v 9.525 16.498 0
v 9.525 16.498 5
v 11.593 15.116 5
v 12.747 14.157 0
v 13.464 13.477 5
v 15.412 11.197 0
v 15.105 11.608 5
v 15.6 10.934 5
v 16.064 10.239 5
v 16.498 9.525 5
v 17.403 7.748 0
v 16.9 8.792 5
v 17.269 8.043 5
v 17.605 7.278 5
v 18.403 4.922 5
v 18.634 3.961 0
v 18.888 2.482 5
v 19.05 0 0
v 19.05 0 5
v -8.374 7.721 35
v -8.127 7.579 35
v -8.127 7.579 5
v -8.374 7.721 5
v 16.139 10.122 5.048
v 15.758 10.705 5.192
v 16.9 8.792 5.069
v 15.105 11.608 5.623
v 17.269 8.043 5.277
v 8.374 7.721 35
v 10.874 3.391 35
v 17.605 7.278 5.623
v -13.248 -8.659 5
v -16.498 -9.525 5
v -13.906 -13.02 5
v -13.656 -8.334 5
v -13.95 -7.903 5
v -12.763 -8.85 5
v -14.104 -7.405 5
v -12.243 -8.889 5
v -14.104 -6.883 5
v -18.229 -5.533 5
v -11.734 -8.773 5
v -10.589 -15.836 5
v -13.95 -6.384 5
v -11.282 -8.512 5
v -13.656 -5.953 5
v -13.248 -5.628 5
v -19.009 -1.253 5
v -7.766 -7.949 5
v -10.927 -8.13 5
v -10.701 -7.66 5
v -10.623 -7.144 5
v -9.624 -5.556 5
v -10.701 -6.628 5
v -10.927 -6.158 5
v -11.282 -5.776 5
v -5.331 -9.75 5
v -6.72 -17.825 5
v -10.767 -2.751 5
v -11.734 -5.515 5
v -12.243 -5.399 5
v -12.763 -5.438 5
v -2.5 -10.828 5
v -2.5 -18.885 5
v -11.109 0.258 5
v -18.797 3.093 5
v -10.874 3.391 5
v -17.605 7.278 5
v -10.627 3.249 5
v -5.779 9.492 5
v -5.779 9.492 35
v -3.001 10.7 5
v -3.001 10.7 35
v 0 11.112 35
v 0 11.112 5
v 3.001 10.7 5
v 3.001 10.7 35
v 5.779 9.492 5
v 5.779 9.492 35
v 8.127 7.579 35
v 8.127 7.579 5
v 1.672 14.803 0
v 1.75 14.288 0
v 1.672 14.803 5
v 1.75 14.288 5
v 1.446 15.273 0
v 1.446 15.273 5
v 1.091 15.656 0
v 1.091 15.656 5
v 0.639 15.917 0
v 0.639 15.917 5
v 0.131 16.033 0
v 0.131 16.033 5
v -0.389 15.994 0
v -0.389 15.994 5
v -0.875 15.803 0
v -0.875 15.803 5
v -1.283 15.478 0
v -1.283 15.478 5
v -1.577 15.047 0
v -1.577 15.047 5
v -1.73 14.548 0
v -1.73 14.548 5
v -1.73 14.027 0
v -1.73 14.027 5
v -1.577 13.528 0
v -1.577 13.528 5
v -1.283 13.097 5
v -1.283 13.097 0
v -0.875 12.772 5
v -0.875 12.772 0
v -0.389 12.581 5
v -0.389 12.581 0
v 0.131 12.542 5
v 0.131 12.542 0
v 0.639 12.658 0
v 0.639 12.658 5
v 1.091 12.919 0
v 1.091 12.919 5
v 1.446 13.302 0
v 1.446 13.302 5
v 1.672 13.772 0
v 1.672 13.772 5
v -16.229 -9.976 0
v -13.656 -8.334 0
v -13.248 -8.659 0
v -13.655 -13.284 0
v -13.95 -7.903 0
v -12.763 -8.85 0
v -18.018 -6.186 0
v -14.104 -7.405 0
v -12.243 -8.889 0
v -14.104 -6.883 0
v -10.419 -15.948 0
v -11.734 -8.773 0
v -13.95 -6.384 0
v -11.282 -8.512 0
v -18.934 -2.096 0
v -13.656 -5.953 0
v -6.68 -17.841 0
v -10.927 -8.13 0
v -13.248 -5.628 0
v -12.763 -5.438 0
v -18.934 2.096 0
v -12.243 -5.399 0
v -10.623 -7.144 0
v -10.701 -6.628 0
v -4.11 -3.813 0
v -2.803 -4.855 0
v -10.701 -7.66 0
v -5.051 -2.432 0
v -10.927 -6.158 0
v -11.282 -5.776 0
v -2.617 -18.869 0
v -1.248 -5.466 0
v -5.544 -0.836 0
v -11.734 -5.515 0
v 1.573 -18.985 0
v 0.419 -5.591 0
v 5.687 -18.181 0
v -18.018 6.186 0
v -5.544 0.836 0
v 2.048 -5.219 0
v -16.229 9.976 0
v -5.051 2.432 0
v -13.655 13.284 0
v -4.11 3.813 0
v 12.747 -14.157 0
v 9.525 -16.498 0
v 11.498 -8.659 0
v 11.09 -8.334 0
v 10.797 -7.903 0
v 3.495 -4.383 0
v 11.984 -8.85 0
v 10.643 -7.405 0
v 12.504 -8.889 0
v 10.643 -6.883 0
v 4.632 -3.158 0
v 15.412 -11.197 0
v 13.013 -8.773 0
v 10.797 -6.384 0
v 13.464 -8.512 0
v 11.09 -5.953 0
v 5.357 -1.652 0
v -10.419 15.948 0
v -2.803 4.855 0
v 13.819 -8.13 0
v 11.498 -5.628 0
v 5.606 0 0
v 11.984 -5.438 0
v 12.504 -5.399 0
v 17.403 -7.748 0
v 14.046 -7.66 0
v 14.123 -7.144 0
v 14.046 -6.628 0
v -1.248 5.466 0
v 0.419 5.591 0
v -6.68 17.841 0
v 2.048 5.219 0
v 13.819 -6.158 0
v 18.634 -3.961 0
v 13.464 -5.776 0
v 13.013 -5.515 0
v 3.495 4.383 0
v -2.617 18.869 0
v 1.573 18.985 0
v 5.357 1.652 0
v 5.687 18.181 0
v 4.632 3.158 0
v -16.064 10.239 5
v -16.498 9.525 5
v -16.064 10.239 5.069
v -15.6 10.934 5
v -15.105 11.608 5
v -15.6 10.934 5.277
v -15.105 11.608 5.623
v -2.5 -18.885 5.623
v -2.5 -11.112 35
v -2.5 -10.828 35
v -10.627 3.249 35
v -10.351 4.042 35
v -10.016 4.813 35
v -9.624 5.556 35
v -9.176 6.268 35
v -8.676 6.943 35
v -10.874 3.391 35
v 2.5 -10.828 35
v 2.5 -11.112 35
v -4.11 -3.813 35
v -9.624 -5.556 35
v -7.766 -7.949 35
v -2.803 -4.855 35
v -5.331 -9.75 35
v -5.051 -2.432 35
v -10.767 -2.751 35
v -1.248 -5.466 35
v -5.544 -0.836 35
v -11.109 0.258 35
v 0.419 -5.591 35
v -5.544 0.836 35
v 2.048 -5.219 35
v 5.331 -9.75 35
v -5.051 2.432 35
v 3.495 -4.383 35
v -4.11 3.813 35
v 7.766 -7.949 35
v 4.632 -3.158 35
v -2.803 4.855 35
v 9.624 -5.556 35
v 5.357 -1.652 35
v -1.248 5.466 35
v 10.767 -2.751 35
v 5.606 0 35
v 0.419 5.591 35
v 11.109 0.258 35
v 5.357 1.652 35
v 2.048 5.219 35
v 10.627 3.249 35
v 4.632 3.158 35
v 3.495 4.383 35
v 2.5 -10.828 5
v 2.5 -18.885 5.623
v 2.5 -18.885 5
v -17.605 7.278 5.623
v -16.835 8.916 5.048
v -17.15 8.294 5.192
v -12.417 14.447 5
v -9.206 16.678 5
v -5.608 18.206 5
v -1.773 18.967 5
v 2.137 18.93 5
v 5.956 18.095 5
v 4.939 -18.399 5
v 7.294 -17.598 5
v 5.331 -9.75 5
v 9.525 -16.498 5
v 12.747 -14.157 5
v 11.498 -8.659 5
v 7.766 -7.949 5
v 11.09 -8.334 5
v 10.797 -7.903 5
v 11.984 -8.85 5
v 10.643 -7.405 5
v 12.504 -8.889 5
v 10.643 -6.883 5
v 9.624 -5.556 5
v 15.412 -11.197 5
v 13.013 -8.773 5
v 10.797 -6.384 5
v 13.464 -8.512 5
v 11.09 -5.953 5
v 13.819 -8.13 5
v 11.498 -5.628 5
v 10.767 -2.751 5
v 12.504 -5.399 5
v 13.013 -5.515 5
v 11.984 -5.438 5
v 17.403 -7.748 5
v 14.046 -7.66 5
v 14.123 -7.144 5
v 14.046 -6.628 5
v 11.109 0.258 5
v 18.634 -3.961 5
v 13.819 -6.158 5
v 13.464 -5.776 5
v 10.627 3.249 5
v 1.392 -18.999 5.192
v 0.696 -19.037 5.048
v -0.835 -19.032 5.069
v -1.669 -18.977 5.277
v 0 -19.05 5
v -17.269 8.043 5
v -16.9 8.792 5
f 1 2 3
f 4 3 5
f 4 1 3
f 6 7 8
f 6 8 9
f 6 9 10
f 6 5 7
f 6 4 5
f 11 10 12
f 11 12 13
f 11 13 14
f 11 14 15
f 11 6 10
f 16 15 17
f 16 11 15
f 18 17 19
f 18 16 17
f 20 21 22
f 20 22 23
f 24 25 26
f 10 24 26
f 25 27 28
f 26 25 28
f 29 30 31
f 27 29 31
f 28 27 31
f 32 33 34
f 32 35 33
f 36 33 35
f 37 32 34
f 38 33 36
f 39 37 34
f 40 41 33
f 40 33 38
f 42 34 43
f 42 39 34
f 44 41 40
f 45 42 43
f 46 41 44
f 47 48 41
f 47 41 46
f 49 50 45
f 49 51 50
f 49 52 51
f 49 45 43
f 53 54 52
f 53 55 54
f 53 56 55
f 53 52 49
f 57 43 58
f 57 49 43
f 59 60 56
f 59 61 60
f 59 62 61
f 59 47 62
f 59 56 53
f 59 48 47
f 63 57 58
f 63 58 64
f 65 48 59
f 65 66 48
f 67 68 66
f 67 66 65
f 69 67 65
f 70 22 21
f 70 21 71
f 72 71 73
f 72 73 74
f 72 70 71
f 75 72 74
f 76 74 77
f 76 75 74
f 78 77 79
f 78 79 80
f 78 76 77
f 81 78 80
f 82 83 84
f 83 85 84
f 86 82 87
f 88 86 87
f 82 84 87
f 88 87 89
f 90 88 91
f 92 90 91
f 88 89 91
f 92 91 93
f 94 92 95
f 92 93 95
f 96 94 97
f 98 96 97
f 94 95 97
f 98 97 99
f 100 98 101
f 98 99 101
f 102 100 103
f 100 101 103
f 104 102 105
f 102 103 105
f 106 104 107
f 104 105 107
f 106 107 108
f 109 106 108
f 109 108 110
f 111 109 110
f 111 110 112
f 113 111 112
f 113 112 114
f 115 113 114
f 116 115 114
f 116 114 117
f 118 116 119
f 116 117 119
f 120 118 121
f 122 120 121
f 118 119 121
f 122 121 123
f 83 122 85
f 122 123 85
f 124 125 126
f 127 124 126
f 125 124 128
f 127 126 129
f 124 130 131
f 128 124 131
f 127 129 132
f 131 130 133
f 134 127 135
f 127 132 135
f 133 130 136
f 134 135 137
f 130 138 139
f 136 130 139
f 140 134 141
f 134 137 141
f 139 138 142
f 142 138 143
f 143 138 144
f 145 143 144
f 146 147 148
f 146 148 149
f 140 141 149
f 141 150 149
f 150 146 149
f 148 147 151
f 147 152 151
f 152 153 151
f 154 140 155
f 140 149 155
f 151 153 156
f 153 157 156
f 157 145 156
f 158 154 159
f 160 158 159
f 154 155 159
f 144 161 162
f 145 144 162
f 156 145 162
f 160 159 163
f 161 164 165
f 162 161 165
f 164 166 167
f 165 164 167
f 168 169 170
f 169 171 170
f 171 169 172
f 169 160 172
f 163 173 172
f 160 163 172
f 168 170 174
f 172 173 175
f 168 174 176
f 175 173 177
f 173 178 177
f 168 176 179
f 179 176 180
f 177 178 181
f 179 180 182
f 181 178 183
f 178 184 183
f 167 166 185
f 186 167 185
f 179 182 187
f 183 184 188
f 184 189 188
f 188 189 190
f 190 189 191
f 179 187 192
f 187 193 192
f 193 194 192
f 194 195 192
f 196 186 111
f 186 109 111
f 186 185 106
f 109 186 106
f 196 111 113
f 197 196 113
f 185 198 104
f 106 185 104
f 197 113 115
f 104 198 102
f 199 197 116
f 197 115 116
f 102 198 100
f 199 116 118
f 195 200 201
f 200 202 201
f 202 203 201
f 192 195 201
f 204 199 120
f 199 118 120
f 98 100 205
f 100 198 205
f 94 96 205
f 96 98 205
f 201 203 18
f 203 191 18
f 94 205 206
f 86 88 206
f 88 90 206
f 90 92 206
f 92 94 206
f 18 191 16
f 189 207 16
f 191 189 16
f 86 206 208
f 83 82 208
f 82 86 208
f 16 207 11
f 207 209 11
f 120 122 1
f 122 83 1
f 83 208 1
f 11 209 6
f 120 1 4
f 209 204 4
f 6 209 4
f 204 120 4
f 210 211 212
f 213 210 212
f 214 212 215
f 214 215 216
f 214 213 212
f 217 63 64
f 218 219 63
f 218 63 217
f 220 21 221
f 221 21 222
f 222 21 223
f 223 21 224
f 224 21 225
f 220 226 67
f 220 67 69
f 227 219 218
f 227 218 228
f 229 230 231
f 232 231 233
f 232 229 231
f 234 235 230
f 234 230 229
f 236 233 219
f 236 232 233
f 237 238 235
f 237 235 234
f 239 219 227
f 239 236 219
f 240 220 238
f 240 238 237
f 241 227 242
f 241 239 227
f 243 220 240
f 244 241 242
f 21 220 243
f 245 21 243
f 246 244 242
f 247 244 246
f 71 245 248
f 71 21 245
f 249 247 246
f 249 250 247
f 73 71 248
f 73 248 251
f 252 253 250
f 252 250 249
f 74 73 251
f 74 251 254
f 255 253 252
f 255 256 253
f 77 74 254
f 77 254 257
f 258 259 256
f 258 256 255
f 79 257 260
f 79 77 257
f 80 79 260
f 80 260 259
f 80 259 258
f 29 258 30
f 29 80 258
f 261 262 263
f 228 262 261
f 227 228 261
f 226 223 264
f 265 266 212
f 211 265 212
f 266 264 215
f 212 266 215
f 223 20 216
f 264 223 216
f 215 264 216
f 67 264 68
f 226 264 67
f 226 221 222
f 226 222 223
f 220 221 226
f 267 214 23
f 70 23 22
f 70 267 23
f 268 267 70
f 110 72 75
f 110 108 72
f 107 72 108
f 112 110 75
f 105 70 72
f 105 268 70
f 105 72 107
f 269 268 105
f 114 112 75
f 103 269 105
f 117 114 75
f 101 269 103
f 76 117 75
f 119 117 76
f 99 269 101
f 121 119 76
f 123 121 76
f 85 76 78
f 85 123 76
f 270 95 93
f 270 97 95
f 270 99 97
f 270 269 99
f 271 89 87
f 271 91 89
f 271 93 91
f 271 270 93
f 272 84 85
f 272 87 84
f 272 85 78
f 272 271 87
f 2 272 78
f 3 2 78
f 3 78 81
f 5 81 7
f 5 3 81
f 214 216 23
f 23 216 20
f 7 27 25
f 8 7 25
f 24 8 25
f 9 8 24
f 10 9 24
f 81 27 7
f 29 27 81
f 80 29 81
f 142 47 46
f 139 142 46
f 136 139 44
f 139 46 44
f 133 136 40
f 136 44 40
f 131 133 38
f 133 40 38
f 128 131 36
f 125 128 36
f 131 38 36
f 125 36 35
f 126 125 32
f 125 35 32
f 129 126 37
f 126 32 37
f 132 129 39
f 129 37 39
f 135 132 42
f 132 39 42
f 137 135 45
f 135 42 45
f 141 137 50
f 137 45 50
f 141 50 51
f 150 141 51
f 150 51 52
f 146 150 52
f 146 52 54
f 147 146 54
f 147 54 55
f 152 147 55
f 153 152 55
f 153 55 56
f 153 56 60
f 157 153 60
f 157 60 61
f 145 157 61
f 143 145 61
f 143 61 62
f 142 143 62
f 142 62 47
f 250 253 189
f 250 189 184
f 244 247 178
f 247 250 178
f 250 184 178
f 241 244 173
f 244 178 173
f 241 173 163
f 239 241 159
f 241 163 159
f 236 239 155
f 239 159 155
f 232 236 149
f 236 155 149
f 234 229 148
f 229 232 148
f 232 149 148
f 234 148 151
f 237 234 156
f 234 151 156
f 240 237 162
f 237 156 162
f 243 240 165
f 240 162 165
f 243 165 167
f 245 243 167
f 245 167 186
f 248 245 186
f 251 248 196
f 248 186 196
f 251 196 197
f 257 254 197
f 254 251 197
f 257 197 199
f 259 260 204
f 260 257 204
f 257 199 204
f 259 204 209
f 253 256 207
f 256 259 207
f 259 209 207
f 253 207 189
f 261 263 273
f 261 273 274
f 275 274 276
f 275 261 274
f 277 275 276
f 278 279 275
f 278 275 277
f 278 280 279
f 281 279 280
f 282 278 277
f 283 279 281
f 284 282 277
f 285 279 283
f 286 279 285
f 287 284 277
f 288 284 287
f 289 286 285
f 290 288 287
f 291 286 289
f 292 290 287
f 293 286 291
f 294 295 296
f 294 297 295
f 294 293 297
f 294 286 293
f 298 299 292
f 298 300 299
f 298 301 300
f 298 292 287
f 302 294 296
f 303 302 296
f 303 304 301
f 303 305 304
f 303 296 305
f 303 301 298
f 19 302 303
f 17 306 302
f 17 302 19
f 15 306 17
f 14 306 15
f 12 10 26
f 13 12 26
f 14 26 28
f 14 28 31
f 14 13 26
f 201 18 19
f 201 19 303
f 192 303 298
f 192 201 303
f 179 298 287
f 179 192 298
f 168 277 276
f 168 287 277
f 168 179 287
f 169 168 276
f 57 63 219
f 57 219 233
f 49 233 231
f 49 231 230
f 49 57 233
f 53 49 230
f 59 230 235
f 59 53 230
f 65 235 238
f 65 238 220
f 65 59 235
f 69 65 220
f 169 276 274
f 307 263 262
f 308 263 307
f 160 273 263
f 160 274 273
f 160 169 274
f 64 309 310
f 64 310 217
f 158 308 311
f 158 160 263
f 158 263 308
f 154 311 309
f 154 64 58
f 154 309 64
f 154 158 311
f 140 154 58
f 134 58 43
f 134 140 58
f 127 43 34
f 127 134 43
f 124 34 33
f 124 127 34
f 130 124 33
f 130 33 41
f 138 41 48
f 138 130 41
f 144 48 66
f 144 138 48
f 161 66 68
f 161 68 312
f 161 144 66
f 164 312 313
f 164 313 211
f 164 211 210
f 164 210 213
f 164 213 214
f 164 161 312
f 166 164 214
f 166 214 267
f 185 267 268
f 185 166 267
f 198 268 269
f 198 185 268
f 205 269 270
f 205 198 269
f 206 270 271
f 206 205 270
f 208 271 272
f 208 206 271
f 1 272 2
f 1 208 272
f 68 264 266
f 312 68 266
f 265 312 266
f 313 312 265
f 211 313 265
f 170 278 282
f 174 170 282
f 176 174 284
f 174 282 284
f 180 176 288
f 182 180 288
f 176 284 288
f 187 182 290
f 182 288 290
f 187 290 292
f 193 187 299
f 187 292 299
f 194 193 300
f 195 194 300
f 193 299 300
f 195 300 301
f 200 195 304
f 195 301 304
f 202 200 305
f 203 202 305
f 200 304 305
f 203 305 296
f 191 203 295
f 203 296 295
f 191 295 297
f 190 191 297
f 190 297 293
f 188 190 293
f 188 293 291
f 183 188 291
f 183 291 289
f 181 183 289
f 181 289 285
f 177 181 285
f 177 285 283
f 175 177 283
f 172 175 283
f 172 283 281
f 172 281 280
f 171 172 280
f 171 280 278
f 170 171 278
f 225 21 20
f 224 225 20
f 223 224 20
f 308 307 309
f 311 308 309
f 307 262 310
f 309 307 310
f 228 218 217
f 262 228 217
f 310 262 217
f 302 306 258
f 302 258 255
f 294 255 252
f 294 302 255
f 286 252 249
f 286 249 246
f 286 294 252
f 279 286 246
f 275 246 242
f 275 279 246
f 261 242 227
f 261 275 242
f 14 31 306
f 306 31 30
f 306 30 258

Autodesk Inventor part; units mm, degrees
ref_plane "YZ Plane" through (0, 0, 0) normal (1, 0, 0) x (0, 1, 0)
ref_plane "XZ Plane" through (0, 0, 0) normal (0, 1, 0) x (-1, 0, 0)
ref_plane "XY Plane" through (0, 0, 0) normal (0, 0, 1) x (1, 0, 0)
sketch "Sketch1" plane through (0, 0, 0) normal (0, 0, 1) x (1, 0, 0)
  circle A0 centre (0, 0) radius 19.05
  circle A1 centre (0, 0) radius 5.6063
  dimension "d0" = 11.2125
  dimension "d2" = 38.1
extrude "Extrusion1" add sketch "Sketch1" along normal blind 5
sketch "Sketch2" plane through (0, 0, 5) normal (0, 0, 1) x (1, 0, 0)
  circle A0 centre (0, 0) radius 5.6063 projected
  circle A1 centre (0, 0) radius 19.05 projected
  circle A2 centre (0, 0) radius 14.2875
  circle A3 centre (0, 0) radius 11.1125
  dimension "d5" = 28.575
  dimension "d26" = 22.225
extrude "Extrusion2" add sketch "Sketch2" along normal blind 30 contours A3
sketch "Sketch3" plane through (0, 0, 5) normal (0, 0, 1) x (1, 0, 0)
  circle A0 centre (0, 0) radius 11.1125 projected
  circle A1 centre (0, 14.2875) radius 1.75
  dimension "d11" = 14.2875
  dimension "d12" = 3.5
extrude "Extrusion3" cut sketch "Sketch3" against normal through all contours A1
sketch "Sketch4" plane through (0, 0, 0) normal (1, 0, 0) x (0, 1, 0)
  line L0 (11.1125, 35) -> (11.1125, 5) projected
  line L1 (11.1125, 5) -> (12.5375, 5) projected
  line L2 (12.5375, 5) -> (12.5375, 0) projected
  line L3 (12.5375, 0) -> (5.6063, 0) projected
  line L4 (5.6063, 0) -> (5.6063, 35) projected
  line L5 (5.6063, 35) -> (11.1125, 35) projected
  line L6 (-19.05, 0) -> (-19.05, 5) projected
  line L7 (-19.05, 5) -> (-11.1125, 5) projected
  line L8 (-11.1125, 5) -> (-11.1125, 35) projected
  line L9 (-11.1125, 35) -> (-5.6063, 35) projected
  line L10 (-5.6063, 35) -> (-5.6063, 0) projected
  line L11 (-5.6063, 0) -> (-19.05, 0) projected
  line L12 (19.05, 5) -> (19.05, 0) projected
  line L13 (19.05, 0) -> (16.0375, 0) projected
  line L14 (16.0375, 0) -> (16.0375, 5) projected
  line L15 (16.0375, 5) -> (19.05, 5) projected
  line L16 (-19.05, 5) -> (-11.1125, 5)
  line L17 (-11.1125, 35) -> (-19.05, 5)
  line L18 (-11.1125, 35) -> (-11.1125, 5)
  point P0 (0, 0)
extrude "Extrusion4" add sketch "Sketch4" along normal mid plane 5 contours L17 L8 L7
sketch "Sketch5" plane through (0, 0, 35) normal (0, 0, 1) x (1, 0, 0)
  circle A0 centre (0, 0) radius 11.1125 projected
  line L0 (2.5, -19.05) -> (0, -19.05) projected
  line L1 (2.5, -11.1125) -> (2.5, -19.05) projected
  line L2 (0, -11.1125) -> (2.5, -11.1125) projected
  line L3 (-2.5, -11.1125) -> (0, -11.1125) projected
  line L4 (-2.5, -19.05) -> (-2.5, -11.1125) projected
  line L5 (0, -19.05) -> (-2.5, -19.05) projected
  line L6 (-2.5, -11.1125) -> (2.5, -11.1125)
  line L7 (2.5, -11.1125) -> (2.5, -10.8276)
  line L8 (2.5, -10.8276) -> (-2.5, -10.8276)
  line L9 (-2.5, -10.8276) -> (-2.5, -11.1125)
extrude "Extrusion5" add sketch "Sketch5" against normal up to surface (30 mm away) contours L8 A0 | A0 L3 L9 | L7 L2 A0 picked at (-0.5582, -10.8803)
sketch "Sketch6" plane through (0, 0, 0) normal (0, 0, -1) x (-1, 0, 0)
  circle A0 centre (0, 0) radius 19.05 projected
  circle A1 centre (0, 0) radius 25.4
  dimension "d19" = 6.35
extrude "Extrusion6" cut sketch "Sketch6" against normal through all
pattern_circular "Circular Pattern1" count 3 over 360 about axis through (0, 0, 5) along (0, 0, 1) of "Extrusion6", "Extrusion5", "Extrusion4", "Extrusion3"
properties part number "GUIDE"
